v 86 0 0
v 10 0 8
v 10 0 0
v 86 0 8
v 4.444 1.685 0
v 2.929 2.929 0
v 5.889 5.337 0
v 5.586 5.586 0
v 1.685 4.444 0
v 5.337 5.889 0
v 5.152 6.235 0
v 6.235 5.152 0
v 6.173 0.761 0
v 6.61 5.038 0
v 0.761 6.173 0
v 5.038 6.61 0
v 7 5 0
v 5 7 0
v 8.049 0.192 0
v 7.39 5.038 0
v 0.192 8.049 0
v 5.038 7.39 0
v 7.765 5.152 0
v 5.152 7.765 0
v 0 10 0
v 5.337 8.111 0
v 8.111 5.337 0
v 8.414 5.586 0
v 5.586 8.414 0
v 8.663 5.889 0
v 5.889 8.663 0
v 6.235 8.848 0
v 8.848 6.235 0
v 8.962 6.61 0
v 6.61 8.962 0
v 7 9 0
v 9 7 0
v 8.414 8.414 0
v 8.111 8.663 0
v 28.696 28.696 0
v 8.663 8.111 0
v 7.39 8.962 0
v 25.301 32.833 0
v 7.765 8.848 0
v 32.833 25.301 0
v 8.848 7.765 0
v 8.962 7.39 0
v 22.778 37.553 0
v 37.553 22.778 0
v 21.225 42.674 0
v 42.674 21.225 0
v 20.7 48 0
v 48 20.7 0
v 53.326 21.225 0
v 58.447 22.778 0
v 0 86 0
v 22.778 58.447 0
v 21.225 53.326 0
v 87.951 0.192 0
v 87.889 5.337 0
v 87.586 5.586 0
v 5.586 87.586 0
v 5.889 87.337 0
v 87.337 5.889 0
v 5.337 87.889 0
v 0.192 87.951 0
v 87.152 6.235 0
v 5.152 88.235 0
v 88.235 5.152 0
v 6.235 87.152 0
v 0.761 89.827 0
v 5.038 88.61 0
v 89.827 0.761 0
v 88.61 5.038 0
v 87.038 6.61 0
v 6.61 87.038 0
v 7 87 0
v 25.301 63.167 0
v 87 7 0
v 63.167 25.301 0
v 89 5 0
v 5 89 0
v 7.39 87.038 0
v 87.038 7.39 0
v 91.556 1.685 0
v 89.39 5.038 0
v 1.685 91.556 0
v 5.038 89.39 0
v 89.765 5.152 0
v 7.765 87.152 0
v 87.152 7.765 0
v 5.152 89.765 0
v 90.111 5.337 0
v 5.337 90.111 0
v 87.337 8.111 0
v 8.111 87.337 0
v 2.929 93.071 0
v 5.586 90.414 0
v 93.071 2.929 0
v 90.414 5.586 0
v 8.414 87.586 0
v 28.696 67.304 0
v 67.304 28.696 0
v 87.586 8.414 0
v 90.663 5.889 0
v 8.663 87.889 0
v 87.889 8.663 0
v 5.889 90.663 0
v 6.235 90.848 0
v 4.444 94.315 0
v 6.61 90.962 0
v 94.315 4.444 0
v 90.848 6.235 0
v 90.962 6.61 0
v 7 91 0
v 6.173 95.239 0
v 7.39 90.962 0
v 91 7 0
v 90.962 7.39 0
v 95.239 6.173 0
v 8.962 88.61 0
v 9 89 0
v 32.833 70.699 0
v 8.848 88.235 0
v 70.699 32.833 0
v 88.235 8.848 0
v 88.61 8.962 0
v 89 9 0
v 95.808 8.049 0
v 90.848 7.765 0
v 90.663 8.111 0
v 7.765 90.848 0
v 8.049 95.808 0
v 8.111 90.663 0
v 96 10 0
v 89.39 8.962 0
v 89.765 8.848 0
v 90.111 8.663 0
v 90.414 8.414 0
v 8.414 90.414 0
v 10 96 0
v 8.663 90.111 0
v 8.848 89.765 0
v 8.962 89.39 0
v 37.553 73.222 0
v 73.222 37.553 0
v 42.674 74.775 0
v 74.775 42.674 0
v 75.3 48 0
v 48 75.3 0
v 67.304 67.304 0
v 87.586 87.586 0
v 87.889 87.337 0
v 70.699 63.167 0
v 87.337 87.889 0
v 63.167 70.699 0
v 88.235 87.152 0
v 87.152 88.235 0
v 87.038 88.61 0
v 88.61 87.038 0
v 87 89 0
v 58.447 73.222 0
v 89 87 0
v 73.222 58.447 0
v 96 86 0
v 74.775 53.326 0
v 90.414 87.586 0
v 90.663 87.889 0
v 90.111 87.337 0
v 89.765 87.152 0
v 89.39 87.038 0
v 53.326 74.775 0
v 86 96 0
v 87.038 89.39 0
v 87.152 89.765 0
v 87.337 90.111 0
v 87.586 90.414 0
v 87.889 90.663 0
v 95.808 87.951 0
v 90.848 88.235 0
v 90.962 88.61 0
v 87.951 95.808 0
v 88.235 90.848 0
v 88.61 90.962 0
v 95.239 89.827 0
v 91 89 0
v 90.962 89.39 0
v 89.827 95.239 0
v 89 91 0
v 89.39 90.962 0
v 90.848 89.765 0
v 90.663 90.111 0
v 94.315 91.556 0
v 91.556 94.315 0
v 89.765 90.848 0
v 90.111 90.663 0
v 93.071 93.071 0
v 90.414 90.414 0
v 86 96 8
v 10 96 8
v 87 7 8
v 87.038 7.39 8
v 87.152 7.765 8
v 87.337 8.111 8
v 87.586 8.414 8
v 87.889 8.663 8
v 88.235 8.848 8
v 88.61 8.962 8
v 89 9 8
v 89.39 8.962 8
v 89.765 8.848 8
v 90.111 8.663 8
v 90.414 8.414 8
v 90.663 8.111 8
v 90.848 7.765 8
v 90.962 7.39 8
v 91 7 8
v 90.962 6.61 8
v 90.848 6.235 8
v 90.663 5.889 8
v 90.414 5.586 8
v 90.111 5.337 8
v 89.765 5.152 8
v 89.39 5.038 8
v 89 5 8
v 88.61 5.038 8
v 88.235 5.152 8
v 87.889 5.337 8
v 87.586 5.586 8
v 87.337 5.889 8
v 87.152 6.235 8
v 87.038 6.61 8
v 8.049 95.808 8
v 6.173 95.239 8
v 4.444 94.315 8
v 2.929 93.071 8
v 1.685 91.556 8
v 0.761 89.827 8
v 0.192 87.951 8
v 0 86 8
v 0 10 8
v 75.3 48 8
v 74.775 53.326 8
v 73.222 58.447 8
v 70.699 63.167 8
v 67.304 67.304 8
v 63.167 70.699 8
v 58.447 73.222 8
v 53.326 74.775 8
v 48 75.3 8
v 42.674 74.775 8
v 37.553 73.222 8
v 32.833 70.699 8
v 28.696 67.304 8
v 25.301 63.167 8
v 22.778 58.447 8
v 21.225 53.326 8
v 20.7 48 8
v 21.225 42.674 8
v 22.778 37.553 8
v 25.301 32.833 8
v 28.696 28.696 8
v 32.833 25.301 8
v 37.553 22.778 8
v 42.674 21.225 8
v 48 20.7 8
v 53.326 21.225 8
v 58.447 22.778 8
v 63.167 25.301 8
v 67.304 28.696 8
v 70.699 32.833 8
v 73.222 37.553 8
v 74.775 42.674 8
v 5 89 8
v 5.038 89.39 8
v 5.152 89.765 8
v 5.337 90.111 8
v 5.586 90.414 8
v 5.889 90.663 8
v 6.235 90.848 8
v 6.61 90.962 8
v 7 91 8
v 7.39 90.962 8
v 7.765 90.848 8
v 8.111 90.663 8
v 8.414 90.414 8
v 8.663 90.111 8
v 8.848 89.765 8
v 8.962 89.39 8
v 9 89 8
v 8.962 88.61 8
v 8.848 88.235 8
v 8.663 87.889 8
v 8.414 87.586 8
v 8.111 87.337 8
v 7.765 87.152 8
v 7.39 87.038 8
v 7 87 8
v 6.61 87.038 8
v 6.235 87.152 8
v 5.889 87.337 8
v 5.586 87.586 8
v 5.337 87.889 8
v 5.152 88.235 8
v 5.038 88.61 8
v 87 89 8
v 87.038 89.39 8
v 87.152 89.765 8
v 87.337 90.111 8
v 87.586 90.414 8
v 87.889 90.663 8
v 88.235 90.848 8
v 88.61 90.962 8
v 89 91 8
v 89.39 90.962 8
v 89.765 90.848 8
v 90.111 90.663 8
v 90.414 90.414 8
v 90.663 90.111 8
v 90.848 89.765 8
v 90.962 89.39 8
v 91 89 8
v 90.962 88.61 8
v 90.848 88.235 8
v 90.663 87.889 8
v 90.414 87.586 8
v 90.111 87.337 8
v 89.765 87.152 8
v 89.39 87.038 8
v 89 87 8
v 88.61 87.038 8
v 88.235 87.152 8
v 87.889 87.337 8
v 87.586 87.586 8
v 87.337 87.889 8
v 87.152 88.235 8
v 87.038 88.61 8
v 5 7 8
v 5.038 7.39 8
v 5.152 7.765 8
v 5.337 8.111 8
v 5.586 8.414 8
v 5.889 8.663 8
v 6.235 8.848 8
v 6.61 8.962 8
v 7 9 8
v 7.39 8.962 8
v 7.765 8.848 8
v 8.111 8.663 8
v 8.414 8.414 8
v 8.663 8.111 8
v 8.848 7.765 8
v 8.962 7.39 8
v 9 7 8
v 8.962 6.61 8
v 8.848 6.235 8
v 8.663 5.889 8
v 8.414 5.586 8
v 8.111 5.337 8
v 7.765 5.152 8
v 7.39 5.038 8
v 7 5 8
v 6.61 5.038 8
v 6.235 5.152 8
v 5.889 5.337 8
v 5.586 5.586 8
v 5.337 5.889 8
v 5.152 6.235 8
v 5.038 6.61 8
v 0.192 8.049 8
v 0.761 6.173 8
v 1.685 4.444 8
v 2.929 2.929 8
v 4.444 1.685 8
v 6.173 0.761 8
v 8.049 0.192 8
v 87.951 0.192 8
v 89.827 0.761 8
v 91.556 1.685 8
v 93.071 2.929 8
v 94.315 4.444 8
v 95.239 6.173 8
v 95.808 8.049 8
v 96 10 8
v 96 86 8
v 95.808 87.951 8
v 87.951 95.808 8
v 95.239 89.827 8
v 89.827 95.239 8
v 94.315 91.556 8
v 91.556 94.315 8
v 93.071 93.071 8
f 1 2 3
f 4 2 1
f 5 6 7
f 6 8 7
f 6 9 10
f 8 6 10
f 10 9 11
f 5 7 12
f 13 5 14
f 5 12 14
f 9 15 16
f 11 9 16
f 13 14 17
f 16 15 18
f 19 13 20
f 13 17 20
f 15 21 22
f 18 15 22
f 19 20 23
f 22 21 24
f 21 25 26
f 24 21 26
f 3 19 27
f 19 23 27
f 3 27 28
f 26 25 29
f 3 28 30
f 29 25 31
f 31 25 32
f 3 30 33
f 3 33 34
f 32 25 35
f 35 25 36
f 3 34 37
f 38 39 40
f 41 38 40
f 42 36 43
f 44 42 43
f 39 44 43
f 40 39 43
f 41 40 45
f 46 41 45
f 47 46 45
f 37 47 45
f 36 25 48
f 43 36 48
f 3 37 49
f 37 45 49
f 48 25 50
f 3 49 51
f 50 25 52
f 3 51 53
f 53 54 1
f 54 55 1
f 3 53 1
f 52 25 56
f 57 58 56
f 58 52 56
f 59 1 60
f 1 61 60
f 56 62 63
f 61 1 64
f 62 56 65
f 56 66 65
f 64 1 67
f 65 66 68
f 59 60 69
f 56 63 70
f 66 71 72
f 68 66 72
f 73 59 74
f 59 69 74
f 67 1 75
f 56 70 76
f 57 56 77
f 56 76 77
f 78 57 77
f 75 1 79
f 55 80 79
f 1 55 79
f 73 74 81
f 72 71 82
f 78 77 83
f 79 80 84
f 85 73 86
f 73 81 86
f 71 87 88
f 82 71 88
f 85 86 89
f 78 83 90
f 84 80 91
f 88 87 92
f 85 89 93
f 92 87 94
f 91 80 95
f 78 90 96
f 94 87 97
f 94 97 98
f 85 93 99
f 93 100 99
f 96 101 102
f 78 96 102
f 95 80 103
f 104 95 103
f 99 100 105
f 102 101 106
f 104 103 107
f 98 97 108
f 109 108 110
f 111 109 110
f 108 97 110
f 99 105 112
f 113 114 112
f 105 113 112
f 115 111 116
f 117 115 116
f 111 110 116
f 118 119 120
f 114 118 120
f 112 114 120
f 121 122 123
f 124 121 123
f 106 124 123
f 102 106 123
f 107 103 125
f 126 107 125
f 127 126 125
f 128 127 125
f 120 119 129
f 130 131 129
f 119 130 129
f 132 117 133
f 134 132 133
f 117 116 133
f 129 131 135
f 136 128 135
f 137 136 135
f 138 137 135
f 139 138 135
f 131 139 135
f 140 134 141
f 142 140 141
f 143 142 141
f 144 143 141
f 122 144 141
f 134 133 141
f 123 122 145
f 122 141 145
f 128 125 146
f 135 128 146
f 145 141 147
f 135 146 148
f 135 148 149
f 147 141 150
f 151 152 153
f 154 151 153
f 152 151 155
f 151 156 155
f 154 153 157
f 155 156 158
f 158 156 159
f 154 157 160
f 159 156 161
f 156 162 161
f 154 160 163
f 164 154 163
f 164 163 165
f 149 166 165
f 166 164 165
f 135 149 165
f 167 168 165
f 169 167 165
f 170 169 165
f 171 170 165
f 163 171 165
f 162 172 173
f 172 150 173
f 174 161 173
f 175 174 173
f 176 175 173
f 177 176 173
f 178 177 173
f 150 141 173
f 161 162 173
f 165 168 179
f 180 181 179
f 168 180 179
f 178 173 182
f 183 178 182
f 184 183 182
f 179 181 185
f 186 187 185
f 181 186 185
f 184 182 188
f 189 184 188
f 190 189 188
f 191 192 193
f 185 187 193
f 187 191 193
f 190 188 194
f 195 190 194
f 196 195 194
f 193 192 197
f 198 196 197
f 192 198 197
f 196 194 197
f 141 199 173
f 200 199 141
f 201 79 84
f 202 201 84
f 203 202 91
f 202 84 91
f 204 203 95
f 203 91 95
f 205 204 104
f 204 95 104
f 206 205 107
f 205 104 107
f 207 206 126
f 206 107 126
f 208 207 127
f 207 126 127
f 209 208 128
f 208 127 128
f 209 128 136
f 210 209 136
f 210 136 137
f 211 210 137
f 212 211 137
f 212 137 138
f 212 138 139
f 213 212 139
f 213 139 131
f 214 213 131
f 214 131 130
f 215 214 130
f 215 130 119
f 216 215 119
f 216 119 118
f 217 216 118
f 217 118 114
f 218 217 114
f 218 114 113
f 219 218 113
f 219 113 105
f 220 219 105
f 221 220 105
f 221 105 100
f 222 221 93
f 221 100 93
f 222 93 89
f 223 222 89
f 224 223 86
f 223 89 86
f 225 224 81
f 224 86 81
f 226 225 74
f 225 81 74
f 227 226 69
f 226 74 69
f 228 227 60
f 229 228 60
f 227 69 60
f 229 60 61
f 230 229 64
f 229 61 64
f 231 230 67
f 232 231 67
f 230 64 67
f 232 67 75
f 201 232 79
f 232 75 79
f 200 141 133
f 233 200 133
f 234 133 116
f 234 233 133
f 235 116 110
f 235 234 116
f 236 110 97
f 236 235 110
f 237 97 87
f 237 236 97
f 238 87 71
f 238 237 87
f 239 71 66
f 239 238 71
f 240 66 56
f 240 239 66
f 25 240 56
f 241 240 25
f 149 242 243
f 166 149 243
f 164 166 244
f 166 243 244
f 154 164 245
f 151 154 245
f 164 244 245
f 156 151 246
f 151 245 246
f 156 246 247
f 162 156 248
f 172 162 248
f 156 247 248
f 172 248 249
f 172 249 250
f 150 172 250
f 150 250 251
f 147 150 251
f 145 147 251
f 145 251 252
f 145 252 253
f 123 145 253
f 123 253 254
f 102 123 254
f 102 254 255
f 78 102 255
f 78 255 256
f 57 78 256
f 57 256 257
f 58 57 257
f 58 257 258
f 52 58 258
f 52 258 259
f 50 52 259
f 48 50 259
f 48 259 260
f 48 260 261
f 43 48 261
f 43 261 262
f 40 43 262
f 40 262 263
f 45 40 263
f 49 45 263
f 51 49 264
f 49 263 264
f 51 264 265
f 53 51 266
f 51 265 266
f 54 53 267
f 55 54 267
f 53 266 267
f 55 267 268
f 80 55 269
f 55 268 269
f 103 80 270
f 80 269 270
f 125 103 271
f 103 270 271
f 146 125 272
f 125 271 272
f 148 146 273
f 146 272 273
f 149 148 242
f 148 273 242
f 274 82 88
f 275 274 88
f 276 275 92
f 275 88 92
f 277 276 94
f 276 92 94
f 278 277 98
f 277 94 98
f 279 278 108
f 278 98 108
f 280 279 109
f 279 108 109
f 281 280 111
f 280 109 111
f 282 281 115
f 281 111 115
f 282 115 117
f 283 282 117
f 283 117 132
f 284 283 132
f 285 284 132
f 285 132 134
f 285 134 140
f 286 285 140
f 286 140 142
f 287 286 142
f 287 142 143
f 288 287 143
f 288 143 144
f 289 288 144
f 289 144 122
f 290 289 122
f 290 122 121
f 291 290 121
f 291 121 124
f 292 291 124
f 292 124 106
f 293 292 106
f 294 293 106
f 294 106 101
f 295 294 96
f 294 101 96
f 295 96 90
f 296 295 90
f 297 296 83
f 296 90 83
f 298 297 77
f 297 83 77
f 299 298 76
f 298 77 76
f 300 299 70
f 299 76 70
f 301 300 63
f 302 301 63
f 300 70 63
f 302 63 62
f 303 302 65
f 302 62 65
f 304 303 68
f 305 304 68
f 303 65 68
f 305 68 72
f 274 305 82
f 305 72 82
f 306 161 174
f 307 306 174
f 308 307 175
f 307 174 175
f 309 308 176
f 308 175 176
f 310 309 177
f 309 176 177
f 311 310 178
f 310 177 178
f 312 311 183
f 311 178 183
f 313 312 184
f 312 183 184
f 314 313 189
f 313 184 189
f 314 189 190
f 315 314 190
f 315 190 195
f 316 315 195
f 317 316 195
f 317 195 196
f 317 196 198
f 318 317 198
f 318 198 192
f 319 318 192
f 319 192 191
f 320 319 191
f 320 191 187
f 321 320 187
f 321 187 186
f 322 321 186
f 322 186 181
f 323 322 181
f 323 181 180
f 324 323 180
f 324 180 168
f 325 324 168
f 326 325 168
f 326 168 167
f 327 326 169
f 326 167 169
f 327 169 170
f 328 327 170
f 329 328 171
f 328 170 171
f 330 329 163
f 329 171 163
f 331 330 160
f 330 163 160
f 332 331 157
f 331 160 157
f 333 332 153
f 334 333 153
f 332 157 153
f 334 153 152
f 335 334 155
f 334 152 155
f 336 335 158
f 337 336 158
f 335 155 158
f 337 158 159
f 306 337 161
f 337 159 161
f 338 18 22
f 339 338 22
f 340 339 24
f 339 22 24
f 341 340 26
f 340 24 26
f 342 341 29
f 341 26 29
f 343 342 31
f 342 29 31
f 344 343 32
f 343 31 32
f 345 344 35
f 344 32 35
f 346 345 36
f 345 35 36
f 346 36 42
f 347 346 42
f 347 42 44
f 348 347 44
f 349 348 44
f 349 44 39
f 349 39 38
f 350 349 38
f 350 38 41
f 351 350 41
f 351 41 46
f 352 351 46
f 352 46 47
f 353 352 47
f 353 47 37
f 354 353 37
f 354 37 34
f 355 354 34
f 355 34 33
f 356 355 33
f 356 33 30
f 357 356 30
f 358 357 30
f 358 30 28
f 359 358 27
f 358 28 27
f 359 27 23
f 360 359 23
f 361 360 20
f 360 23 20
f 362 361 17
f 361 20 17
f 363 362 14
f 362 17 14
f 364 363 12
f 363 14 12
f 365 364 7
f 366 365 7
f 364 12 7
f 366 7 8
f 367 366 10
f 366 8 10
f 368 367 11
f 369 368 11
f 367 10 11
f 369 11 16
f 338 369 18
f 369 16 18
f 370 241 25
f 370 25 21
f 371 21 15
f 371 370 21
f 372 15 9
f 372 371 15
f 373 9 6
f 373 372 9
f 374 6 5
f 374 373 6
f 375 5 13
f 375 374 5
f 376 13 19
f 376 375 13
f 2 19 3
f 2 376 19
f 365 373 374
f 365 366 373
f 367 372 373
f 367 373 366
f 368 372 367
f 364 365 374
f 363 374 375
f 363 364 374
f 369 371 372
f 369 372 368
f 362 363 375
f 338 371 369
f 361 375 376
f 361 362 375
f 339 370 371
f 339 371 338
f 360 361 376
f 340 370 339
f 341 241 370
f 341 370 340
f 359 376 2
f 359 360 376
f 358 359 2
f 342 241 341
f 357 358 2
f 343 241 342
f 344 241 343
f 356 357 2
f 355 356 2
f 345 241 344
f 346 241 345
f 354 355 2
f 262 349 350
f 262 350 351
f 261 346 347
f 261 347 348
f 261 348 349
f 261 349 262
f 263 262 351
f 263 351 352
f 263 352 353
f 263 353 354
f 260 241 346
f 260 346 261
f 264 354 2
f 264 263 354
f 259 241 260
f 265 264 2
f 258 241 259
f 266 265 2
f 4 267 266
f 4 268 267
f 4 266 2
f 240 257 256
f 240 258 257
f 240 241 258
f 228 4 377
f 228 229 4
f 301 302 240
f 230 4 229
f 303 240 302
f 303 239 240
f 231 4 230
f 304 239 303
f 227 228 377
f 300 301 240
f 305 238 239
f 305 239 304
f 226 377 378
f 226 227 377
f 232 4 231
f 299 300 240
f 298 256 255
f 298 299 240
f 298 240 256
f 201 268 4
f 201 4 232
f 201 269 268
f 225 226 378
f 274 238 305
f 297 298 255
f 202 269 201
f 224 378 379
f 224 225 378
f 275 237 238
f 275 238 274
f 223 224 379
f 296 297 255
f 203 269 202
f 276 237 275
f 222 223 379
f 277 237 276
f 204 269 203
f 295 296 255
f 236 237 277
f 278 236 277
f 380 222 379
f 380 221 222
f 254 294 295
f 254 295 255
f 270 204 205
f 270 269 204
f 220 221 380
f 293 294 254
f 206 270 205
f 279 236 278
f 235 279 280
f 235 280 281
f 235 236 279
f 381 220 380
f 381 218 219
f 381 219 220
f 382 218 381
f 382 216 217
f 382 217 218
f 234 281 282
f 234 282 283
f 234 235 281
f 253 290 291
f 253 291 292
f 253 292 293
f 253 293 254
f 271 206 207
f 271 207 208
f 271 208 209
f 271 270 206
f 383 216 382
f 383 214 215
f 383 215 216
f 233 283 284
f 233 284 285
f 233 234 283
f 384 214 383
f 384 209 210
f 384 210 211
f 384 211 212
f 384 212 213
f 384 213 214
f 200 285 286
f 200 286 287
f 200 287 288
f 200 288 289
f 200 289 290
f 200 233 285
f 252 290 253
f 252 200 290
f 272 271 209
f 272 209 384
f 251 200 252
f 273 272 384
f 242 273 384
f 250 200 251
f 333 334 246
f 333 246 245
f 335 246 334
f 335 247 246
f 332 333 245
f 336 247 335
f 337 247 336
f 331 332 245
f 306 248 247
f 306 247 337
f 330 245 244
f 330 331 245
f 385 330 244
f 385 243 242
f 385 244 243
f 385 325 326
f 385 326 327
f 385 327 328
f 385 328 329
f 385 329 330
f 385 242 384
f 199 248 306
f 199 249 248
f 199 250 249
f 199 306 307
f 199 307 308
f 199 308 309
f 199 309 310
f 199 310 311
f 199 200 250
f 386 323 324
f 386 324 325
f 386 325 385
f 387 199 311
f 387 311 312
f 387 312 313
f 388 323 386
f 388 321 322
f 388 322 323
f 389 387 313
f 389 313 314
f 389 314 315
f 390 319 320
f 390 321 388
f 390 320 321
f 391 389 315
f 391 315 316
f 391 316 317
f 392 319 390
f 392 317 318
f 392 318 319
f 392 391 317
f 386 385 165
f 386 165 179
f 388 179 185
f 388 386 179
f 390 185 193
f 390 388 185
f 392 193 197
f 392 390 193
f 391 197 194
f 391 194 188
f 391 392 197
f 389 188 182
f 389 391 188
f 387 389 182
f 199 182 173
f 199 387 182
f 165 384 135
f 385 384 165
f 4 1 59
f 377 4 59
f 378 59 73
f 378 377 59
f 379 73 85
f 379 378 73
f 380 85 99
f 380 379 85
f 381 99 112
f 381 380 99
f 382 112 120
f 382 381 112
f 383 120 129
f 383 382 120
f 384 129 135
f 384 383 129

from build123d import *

# Parameters (mm, degrees)
SKETCH1_W           = 96
SKETCH1_H           = 96
BOSS_EXTRUDE1_DEPTH = 0.6
CUT_EXTRUDE1_DEPTH  = 74.6
SKETCH3_R           = 27.3
CUT_EXTRUDE2_DEPTH  = 74.6
SKETCH4_R           = 2
CUT_EXTRUDE3_DEPTH  = 74.6
SKETCH5_R           = 37.3
SKETCH5_R_2         = 27.3
BOSS_EXTRUDE3_DEPTH = 2.5
BOSS_EXTRUDE3_DRAFT = 42
BOSS_EXTRUDE4_START = 7.4
SKETCH8_R           = 27.3
BOSS_EXTRUDE4_DEPTH = 7.4
SKETCH9_R           = 2
CUT_EXTRUDE4_DEPTH  = 137


with BuildPart() as part:
    # Sketch1 → Boss-Extrude1 (new body)
    with BuildSketch(Plane.XY):
        with Locations((48, 48)):
            Rectangle(SKETCH1_W, SKETCH1_H)
    extrude(amount=BOSS_EXTRUDE1_DEPTH)

    # Sketch2 → Cut-Extrude1 (cut)
    with BuildSketch(Plane.XY.offset(0.6)):
        with BuildLine():
            Line((10, 96), (0, 96))
            Line((0, 96), (0, 86))
            ThreePointArc((0, 86), (2.928932188, 93.071067812), (10, 96))
        make_face()
        with BuildLine():
            Line((86, 96), (96, 96))
            Line((96, 96), (96, 86))
            ThreePointArc((96, 86), (93.071067812, 93.071067812), (86, 96))
        make_face()
        with BuildLine():
            Line((86, 0), (96, 0))
            Line((96, 0), (96, 10))
            ThreePointArc((96, 10), (93.071067812, 2.928932188), (86, 0))
        make_face()
        with BuildLine():
            Line((0, 0), (10, 0))
            ThreePointArc((10, 0), (2.928932188, 2.928932188), (0, 10))
            Line((0, 10), (0, 0))
        make_face()
    extrude(amount=-CUT_EXTRUDE1_DEPTH, mode=Mode.SUBTRACT)

    # Sketch3 → Cut-Extrude2 (cut)
    with BuildSketch(Plane.XY.offset(0.6)):
        with Locations((48, 48)):
            Circle(SKETCH3_R)
    extrude(amount=-CUT_EXTRUDE2_DEPTH, mode=Mode.SUBTRACT)

    # Sketch4 → Cut-Extrude3 (cut)
    with BuildSketch(Plane(origin=(0, 0, 0), x_dir=(-1, 0, 0), z_dir=(0, 0, -1))):
        with Locations((-89, 89)):
            Circle(SKETCH4_R)
        with Locations((-7, 89)):
            Circle(SKETCH4_R)
        with Locations((-7, 7)):
            Circle(SKETCH4_R)
        with Locations((-89, 7)):
            Circle(SKETCH4_R)
    extrude(amount=-CUT_EXTRUDE3_DEPTH, mode=Mode.SUBTRACT)


with BuildPart() as boss_extrude3_tool:
    # Sketch5 → Boss-Extrude3 (with draft: the straight prism first)
    with BuildSketch(Plane.XY.offset(0.6)):
        with Locations((48, 48)):
            Circle(SKETCH5_R)
        with Locations((48, 48)):
            Circle(SKETCH5_R_2, mode=Mode.SUBTRACT)
    extrude(amount=BOSS_EXTRUDE3_DEPTH)
    # Boss-Extrude3: the draft: its side faces are tilted about the plane it starts from
    boss_extrude3_sides = [boss_extrude3_tool.faces().sort_by_distance(p)[0] for p in [
        (10.7, 48, 1.85),
        (20.7, 48, 1.85),
    ]]
    draft(boss_extrude3_sides, Plane.XY.offset(0.6), BOSS_EXTRUDE3_DRAFT)


with BuildPart() as part_1:
    add(part.part)

    # Boss-Extrude3: add boss_extrude3_tool
    add(boss_extrude3_tool.part)

    # Sketch8 → Boss-Extrude4 (add)
    with BuildSketch(Plane.XY.offset(0.6).offset(BOSS_EXTRUDE4_START)):
        with BuildLine():
            Line((0, 86), (0, 10))
            ThreePointArc((0, 10), (2.928932188, 2.928932188), (10, 0))
            Line((10, 0), (86, 0))
            ThreePointArc((86, 0), (93.071067812, 2.928932188), (96, 10))
            Line((96, 10), (96, 86))
            ThreePointArc((96, 86), (93.071067812, 93.071067812), (86, 96))
            Line((86, 96), (10, 96))
            ThreePointArc((10, 96), (2.928932188, 93.071067812), (0, 86))
        make_face()
        with Locations((48, 48)):
            Circle(SKETCH8_R, mode=Mode.SUBTRACT)
    extrude(amount=-BOSS_EXTRUDE4_DEPTH)

    # Sketch9 → Cut-Extrude4 (cut, through all)
    with BuildSketch(Plane(origin=(0, 0, 0), x_dir=(-1, 0, 0), z_dir=(0, 0, -1))):
        with Locations((-7, 89)):
            Circle(SKETCH9_R)
        with Locations((-89, 89)):
            Circle(SKETCH9_R)
        with Locations((-89, 7)):
            Circle(SKETCH9_R)
        with Locations((-7, 7)):
            Circle(SKETCH9_R)
    extrude(amount=-CUT_EXTRUDE4_DEPTH, mode=Mode.SUBTRACT)


solid = part_1.part
